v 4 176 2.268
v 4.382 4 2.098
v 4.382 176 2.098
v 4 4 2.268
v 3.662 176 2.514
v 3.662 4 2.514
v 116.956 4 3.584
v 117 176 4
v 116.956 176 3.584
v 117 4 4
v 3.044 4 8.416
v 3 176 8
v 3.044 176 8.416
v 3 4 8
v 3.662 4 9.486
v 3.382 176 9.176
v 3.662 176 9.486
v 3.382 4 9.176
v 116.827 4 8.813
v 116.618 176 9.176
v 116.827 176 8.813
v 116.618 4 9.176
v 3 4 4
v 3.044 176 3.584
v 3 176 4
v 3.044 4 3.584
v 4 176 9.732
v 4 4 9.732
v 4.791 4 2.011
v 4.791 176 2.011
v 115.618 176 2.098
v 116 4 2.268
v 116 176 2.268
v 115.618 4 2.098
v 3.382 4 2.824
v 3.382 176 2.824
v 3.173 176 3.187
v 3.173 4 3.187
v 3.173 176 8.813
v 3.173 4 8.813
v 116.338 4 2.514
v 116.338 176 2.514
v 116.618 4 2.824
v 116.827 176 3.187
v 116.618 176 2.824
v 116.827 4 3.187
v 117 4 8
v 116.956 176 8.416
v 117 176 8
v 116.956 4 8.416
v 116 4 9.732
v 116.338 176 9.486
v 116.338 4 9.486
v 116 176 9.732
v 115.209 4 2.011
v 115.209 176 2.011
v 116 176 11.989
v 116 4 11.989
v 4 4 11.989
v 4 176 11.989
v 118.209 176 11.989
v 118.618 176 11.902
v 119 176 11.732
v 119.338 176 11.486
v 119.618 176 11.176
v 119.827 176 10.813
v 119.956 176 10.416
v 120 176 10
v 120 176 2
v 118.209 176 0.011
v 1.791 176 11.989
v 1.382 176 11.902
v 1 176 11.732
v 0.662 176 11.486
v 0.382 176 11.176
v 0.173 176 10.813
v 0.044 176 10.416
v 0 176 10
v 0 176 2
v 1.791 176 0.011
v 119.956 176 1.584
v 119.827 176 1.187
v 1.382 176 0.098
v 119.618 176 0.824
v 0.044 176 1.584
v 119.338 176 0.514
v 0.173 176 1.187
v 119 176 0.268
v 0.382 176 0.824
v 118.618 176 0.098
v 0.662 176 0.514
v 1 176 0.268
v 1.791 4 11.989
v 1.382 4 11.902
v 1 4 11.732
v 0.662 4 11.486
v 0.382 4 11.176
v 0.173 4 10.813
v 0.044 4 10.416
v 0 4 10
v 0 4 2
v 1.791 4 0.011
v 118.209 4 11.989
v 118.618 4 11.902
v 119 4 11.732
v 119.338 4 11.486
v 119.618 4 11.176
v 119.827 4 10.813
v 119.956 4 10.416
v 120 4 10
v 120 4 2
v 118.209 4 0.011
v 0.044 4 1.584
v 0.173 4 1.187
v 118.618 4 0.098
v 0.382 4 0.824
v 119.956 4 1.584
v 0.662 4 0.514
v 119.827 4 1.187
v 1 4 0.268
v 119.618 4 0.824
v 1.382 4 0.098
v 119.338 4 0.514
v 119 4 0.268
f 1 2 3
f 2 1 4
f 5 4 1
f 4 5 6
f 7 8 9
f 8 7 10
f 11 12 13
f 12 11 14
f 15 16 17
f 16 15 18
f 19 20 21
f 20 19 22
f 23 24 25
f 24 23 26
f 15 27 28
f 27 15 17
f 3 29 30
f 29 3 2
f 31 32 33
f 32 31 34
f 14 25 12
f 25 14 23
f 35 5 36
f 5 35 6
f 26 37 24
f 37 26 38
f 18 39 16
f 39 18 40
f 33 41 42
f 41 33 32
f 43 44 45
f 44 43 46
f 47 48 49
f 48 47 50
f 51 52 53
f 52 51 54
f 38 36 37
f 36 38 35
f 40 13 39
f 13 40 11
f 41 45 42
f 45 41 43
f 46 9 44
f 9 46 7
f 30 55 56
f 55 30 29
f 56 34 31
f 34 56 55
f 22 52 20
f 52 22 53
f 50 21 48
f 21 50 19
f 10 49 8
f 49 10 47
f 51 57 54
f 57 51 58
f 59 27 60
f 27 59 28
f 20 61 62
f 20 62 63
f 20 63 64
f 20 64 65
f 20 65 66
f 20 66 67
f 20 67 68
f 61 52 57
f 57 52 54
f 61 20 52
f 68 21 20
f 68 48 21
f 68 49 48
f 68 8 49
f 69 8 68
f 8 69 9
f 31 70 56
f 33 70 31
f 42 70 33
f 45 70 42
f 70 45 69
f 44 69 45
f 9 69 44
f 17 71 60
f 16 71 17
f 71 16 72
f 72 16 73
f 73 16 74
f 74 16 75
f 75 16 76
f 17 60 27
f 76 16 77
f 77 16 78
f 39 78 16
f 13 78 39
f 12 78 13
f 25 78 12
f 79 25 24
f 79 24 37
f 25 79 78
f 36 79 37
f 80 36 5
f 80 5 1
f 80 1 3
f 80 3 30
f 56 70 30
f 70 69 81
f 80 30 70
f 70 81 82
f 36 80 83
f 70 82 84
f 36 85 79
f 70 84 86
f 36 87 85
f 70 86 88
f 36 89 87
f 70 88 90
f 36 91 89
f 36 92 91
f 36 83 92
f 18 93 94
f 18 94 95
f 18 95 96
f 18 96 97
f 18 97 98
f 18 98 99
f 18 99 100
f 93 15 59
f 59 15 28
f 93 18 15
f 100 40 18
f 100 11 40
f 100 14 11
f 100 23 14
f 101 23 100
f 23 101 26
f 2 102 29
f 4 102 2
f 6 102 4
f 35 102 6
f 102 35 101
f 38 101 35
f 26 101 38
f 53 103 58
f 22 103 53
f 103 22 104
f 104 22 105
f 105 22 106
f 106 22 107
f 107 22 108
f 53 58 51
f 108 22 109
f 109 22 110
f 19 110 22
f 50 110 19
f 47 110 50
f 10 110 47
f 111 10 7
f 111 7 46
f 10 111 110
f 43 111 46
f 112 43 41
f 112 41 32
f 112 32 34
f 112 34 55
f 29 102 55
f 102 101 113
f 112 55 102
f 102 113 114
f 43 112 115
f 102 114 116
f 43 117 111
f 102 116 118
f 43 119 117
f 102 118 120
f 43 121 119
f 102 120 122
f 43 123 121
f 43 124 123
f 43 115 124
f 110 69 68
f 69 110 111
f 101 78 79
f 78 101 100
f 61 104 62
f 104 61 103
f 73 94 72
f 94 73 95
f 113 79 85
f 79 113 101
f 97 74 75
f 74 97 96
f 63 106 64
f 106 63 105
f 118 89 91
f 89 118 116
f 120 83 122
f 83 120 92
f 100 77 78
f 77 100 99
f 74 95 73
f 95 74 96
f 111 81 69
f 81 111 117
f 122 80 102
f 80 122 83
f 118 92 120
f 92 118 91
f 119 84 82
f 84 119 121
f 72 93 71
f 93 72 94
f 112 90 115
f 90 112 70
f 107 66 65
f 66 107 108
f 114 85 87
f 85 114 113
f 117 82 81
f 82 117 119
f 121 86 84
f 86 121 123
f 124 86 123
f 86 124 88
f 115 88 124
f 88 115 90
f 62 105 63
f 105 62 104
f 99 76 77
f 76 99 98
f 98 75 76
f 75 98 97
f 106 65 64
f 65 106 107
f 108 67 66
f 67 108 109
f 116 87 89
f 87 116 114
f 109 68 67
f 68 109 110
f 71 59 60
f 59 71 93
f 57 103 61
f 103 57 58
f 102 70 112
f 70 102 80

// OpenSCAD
$fn=30;

length = 180;
width= 120;
height = 12;
radius = 2;
rand   = 2;
rand6  = 3;
rand2  = 200;
rand3  = 0;
rand5  = 0;
rand4  = 4;


difference(){
translate([0, 0, 0]){ 
   roundedBox(length, width, height, radius);
}
union(){
translate([rand6, rand, rand]){ 
    roundedBox(length - 2*rand, width - 2*rand6, height- 2*rand, radius);
}

translate([rand2, rand2, 2*rand-height ]){ 
    roundedBox(length - 2*rand2, width - 2*rand2, height, 0);
}

translate([rand4, rand4, height-2*rand]){ 
    roundedBox(length - 2*rand4, width - 2*rand4, height, 0);
}


translate([rand5, -length+rand*2, rand5 ]){ 
    roundedBox(length, width - 2*rand5, height- 2*rand5, 0);
}

translate([rand3,length-rand*2, rand3 ]){ 
    roundedBox(length , width - 2*rand3, height- 2*rand3, 0);
}

}
}

module roundedBox(length, width, height, radius)
{
    dRadius = 2*radius;
    //base rounded shape
translate([radius, radius, radius]){ 
    minkowski() {
        cube(size=[width-dRadius,length-dRadius, height-dRadius]);
        sphere(r=radius);
    } 
}
}
